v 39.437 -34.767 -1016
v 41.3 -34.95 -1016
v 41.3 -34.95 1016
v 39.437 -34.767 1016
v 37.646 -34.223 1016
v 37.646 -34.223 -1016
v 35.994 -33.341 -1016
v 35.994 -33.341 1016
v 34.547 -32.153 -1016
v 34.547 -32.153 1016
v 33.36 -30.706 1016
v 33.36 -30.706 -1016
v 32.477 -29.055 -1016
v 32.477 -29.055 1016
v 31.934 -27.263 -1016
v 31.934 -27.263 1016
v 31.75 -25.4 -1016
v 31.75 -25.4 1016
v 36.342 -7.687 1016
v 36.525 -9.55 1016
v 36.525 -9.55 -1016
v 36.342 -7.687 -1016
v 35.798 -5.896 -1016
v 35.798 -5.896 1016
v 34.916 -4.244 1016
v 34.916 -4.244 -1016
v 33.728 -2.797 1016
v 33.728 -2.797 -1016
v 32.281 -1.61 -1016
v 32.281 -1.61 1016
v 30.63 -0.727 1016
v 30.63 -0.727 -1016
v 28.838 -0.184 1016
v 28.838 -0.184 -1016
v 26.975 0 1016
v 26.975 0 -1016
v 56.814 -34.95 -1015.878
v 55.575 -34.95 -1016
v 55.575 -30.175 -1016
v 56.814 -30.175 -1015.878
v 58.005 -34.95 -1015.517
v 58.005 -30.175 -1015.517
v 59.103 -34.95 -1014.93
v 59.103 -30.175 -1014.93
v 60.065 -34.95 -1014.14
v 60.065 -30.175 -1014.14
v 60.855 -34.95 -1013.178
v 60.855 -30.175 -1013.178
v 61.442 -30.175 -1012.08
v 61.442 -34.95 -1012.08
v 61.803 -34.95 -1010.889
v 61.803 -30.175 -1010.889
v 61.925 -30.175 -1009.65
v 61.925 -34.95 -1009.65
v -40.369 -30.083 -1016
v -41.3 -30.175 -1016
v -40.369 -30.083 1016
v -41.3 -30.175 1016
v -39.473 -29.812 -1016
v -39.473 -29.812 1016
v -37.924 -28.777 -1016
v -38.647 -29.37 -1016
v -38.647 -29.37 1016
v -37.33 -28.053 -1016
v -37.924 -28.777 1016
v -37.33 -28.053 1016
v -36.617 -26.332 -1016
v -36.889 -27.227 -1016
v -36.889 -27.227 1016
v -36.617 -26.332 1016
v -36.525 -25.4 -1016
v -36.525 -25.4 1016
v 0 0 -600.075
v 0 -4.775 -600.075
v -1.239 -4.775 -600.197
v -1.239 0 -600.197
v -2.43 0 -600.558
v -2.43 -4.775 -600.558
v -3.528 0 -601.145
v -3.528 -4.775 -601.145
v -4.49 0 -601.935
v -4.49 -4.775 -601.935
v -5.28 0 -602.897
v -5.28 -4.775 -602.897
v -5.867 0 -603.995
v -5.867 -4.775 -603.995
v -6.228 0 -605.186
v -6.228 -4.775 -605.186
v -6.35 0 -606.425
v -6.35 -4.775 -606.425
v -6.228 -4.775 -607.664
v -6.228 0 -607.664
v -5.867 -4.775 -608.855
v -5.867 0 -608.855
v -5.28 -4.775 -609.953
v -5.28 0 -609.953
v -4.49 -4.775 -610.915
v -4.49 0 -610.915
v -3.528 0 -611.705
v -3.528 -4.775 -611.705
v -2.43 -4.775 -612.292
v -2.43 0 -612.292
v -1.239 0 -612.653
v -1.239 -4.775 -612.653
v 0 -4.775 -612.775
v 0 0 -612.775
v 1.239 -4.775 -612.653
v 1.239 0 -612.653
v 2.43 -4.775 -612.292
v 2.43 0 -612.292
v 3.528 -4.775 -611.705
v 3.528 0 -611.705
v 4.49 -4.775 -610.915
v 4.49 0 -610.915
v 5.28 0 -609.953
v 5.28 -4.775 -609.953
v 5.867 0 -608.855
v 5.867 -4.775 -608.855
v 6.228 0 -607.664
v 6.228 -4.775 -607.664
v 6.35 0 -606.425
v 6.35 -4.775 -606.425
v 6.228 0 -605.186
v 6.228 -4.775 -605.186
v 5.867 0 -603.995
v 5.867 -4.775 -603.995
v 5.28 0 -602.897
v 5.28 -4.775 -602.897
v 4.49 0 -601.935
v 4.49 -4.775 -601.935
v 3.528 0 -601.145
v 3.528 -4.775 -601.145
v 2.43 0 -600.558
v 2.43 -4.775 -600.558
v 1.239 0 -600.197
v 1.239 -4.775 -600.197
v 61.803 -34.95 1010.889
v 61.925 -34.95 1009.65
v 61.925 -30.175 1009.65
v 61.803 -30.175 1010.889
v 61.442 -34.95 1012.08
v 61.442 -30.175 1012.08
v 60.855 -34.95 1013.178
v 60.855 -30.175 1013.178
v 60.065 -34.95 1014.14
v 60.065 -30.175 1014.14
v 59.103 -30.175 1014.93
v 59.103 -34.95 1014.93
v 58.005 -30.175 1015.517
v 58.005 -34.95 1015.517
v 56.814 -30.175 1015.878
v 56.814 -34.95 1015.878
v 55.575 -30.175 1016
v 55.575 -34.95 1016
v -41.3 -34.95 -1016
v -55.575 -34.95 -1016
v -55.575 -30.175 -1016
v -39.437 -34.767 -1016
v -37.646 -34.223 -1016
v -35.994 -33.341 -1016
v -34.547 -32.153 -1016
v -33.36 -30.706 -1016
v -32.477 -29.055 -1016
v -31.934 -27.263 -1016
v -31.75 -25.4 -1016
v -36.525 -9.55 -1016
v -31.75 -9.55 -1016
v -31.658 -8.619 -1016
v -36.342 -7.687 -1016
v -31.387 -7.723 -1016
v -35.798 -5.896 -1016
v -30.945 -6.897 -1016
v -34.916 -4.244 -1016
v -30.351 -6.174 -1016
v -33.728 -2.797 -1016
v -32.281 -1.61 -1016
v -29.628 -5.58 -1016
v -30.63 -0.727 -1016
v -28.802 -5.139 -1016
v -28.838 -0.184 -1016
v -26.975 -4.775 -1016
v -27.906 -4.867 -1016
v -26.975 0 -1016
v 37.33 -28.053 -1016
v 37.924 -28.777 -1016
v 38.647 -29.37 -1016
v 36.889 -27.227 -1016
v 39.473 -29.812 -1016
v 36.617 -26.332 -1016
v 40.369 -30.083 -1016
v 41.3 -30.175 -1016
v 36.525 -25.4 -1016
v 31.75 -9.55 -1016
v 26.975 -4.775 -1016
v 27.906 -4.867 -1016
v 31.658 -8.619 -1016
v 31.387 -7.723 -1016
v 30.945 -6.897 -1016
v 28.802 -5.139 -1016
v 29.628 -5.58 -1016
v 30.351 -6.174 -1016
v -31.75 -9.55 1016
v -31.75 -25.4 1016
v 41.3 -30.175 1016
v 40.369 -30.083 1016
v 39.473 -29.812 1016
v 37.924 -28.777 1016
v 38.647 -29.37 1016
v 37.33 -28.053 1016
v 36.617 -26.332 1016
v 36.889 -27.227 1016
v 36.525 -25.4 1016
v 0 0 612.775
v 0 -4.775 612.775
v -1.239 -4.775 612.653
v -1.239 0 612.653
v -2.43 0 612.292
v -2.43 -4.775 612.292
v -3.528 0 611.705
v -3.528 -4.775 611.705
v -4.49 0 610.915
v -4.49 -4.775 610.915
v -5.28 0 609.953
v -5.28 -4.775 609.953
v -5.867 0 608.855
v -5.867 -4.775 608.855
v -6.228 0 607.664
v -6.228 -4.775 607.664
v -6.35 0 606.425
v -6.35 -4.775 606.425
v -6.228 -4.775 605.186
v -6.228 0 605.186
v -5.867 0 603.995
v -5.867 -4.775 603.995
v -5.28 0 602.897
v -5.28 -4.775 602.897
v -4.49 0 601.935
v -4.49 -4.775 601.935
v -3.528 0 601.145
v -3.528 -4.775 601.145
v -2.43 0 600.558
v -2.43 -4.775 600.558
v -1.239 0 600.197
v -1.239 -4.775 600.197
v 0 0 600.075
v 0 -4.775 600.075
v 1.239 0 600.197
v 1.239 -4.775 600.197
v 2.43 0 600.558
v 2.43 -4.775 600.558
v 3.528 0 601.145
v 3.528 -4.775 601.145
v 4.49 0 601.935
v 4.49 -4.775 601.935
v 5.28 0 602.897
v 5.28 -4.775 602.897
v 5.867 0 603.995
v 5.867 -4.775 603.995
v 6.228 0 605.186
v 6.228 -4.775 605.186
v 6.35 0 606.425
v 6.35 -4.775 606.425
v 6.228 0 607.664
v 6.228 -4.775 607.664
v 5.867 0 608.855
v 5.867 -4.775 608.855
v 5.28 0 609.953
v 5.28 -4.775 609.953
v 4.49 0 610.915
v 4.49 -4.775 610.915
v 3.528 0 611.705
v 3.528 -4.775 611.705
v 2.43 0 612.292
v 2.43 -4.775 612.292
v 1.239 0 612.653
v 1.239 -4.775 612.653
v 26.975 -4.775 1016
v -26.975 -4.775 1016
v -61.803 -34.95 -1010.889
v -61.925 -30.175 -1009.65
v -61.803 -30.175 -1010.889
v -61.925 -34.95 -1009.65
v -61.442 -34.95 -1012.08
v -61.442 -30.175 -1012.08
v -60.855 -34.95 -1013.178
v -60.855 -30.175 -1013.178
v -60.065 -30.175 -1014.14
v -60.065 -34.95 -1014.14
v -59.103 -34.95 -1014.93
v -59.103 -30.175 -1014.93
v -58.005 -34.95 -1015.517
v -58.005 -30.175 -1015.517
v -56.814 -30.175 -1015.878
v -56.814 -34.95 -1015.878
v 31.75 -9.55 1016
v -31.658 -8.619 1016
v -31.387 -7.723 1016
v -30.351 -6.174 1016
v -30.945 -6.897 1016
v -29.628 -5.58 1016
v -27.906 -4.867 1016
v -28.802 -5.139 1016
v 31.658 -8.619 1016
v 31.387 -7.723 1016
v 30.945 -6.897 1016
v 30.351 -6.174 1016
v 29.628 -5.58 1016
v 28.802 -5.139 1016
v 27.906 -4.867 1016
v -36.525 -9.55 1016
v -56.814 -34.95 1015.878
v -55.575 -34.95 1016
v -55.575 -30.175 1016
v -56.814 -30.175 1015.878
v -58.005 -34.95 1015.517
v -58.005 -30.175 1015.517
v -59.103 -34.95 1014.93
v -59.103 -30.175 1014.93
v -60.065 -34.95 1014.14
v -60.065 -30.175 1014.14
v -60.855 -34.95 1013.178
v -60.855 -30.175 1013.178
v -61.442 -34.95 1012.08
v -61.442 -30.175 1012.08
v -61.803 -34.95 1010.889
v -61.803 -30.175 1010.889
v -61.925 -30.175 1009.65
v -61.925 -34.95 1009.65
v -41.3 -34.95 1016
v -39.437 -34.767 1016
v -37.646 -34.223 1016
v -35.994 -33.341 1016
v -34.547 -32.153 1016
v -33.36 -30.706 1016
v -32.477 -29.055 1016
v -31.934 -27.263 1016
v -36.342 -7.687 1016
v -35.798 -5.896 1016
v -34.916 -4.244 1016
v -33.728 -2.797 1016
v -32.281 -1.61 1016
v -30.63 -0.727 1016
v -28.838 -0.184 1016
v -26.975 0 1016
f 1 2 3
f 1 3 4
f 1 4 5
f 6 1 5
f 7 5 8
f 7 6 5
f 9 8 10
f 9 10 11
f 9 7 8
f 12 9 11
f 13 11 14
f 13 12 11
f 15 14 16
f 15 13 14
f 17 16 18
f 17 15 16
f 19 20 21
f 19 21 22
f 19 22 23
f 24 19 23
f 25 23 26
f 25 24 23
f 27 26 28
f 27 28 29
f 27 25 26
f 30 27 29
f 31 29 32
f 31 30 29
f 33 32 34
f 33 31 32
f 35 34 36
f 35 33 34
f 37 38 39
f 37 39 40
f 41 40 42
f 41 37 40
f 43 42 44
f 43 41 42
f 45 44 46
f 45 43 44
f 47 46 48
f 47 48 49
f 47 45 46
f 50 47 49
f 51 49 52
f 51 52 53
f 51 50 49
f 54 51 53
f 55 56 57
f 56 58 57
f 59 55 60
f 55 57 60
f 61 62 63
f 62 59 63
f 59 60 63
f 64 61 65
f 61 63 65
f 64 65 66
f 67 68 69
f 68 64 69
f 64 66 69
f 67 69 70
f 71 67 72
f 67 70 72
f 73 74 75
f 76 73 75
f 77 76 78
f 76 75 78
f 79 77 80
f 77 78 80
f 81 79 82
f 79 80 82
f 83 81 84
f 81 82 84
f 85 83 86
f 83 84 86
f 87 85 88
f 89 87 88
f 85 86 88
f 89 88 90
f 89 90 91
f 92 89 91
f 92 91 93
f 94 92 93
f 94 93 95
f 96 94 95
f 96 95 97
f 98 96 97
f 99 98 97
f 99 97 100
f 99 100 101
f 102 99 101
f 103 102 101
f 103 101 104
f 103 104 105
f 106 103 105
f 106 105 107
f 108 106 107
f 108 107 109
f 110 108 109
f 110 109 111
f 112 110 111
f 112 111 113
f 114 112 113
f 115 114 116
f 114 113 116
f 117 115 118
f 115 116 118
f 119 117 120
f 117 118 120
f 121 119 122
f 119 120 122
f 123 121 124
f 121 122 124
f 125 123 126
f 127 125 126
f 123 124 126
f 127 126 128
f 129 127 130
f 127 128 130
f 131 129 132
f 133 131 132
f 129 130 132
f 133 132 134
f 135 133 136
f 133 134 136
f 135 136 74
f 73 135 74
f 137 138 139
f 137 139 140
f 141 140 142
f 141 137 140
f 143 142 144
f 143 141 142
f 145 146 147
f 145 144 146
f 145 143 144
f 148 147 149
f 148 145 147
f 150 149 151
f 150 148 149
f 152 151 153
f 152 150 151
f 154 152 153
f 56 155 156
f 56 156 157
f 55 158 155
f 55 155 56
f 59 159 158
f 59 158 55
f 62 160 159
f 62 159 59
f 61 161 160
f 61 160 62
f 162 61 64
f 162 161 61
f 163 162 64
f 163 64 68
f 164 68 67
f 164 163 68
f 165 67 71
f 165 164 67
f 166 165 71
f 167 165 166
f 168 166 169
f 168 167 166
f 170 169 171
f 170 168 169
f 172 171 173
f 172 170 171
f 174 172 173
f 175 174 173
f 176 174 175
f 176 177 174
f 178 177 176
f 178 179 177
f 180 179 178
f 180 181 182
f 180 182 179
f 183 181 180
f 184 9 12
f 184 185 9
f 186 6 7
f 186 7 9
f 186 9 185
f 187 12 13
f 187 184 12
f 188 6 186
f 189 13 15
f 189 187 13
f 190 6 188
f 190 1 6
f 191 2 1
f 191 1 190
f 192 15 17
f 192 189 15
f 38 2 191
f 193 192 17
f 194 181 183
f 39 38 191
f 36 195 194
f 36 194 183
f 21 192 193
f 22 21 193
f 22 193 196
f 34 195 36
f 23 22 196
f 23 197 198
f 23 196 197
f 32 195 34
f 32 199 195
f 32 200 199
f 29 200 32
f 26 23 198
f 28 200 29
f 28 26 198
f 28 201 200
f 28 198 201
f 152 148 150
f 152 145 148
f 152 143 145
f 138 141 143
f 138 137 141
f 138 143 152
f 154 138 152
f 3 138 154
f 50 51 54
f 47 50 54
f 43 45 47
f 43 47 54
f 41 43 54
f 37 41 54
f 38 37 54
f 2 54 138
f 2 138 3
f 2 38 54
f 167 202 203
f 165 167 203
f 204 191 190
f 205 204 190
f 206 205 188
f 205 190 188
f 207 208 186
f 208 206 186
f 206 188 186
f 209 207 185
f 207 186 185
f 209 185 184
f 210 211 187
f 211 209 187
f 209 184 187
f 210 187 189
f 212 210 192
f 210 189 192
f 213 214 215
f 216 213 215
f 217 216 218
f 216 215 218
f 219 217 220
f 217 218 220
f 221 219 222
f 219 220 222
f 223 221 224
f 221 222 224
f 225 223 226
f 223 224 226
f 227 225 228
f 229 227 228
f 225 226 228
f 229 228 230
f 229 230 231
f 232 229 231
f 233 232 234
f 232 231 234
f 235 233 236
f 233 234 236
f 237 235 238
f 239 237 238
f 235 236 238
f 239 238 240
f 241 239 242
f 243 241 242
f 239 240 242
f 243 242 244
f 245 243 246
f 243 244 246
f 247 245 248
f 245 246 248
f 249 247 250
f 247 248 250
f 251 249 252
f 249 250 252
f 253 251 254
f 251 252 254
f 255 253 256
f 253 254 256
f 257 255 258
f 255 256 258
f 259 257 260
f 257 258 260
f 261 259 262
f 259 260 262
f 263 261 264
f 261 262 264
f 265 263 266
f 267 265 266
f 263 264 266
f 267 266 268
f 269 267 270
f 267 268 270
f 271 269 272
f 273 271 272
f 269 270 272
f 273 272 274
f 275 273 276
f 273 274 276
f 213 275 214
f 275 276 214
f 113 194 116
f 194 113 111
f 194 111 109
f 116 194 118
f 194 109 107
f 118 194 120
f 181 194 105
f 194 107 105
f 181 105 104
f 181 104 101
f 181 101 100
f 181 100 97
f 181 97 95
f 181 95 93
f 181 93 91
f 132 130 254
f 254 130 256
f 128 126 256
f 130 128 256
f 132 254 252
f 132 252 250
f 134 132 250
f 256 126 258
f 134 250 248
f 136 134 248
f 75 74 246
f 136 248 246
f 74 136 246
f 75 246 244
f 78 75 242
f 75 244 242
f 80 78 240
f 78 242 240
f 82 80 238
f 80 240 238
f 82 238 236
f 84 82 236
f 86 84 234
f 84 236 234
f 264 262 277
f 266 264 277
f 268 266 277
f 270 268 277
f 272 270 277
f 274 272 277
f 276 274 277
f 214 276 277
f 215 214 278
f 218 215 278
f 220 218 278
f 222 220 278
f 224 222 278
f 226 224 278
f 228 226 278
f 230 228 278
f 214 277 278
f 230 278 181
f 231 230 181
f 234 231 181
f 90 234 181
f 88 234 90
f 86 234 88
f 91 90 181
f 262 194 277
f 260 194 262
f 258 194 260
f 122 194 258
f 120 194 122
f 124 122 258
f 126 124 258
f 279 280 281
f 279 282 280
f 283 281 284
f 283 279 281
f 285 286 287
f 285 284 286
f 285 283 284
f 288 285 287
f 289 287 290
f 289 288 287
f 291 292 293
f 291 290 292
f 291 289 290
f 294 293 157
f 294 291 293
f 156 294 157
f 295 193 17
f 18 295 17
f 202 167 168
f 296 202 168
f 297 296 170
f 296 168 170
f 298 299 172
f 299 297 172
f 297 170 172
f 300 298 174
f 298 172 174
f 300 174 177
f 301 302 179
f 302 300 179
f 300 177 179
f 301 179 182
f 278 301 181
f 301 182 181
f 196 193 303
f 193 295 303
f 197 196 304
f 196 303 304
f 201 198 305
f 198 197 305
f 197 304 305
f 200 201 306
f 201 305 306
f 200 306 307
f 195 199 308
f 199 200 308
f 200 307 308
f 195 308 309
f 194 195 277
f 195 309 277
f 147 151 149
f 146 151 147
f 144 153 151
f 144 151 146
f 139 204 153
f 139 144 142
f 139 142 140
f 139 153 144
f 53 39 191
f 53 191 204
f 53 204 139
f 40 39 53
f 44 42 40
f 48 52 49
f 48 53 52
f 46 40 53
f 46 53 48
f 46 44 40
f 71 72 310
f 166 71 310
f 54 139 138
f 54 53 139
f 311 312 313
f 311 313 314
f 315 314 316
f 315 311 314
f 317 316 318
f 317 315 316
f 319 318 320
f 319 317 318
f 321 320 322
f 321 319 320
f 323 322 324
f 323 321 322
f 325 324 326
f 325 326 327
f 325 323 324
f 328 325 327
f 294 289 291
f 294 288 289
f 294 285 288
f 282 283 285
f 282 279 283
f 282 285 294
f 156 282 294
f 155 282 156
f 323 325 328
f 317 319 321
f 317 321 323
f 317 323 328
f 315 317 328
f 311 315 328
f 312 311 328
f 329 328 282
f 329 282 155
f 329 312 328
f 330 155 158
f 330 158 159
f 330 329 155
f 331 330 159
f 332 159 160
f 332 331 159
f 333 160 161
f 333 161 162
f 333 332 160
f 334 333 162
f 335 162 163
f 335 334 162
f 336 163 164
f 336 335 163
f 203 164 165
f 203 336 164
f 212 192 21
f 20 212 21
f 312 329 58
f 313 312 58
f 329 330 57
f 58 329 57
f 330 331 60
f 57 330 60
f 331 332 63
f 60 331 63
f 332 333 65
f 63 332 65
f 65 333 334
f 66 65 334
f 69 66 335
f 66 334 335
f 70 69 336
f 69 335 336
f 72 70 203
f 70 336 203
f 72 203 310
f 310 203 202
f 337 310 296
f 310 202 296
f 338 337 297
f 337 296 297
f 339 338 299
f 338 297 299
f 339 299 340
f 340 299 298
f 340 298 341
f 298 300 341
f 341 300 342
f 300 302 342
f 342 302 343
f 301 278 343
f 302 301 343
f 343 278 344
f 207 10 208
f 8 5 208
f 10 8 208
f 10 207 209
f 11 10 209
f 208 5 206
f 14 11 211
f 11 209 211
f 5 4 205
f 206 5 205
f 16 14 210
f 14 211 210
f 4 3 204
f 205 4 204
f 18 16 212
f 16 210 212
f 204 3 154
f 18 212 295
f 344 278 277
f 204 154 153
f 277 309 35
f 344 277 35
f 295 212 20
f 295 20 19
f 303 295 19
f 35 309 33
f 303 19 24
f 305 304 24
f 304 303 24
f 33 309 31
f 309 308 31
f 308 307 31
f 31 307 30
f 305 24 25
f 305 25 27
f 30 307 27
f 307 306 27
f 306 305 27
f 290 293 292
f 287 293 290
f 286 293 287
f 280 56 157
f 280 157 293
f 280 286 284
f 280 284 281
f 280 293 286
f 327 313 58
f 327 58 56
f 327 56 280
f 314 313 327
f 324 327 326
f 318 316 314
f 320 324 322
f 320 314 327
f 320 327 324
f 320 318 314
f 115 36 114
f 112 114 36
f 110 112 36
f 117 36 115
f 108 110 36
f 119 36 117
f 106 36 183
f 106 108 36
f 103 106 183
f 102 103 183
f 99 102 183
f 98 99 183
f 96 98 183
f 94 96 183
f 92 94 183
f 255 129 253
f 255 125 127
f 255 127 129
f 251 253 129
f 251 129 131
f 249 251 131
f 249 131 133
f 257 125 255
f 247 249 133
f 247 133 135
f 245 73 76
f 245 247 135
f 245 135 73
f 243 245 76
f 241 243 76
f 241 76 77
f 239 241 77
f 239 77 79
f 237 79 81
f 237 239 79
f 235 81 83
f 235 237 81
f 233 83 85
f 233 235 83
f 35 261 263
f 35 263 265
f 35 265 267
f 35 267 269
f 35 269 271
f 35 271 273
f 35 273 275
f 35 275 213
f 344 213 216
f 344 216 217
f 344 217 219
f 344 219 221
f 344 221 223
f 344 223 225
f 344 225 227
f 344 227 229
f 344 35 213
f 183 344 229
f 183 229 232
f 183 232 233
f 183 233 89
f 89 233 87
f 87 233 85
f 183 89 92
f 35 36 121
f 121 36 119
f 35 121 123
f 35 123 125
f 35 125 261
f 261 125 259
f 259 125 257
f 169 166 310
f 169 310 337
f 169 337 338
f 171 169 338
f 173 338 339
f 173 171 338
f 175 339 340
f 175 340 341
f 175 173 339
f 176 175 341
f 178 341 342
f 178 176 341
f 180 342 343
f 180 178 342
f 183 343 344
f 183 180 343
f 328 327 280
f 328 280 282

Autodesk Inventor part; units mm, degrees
ref_plane "YZ Plane" through (0, 0, 0) normal (1, 0, 0) x (0, 1, 0)
ref_plane "XZ Plane" through (0, 0, 0) normal (0, 1, 0) x (-1, 0, 0)
ref_plane "XY Plane" through (0, 0, 0) normal (0, 0, 1) x (1, 0, 0)
sketch "Sketch1" plane through (0, 0, 0) normal (0, 0, 1) x (1, 0, 0)
  point P0 (0, 0)
sketch "Sketch2" plane through (0, 0, 0) normal (0, 1, 0) x (-1, 0, 0)
  line L0 (-31.75, 1016) -> (31.75, 1016)
  line L1 (31.75, 1016) -> (31.75, -1016)
  line L2 (31.75, -1016) -> (-31.75, -1016)
  line L3 (-31.75, -1016) -> (-31.75, 1016)
  line L4 (-31.75, 1016) -> (31.75, -1016) construction
  line L5 (31.75, 1016) -> (-31.75, -1016) construction
  line L6 (0, -1016) -> (0, 1016)
  point P0 (0, 0)
  point P1 (0, -657.225)
  point P2 (0, -606.425)
  point P3 (0, 657.225)
  point P4 (0, 606.425)
  point P5 (0, 0)
  dimension "d0" = 63.5
  dimension "d1" = 2032
  dimension "d24" = 50.8
  dimension "d26" = 50.8
  dimension "d27" = 1212.85
  dimension "d28" = 606.425
extrude "Plate1" add sketch "Sketch2" against normal blind 4.7752
sketch "Sketch3" plane through (36.5252, 0, 1016) normal (-1, 0, 0) x (0, -1, 0)
  line L0 (0, -2032) -> (0, 0)
  line L1 (0, 0) -> (30.1752, 0)
  line L2 (30.1752, 0) -> (30.1752, -2032)
  line L3 (30.1752, -2032) -> (0, -2032)
edge flange "Flange1" height 25.4 angle 90 thickness 4.7752 bend radius 4.7752 thickness toward (-1, 0, 0) relief tear relief width 4.7752 relief depth 2.3876 corner gap 4.7752 corner form 0 edges at (31.75, -4.7752, 0) (-31.75, -4.7752, 0) wall of the first edge with corners at (36.5252, 0, -1016) (36.5252, 0, 1016) (36.5252, -30.1752, 1016) (36.5252, -30.1752, -1016)
bend "Bend1"
corner "Corner1"
sketch "Sketch4" plane through (31.75, -34.9504, -1016) normal (0, 1, 0) x (-1, 0, 0)
  line L0 (0, 2032) -> (0, 0)
  line L1 (0, 0) -> (-30.1752, 0)
  line L2 (-30.1752, 0) -> (-30.1752, 2032)
  line L3 (-30.1752, 2032) -> (0, 2032)
edge flange "Flange2" height 25.4 angle 90 thickness 4.7752 bend radius 4.7752 thickness toward (0, 1, 0) relief tear relief width 4.7752 relief depth 2.3876 corner gap 4.7752 corner form 0 edges at (36.5252, -30.1752, 0) (-36.5252, -30.1752, 0) wall of the first edge with corners at (31.75, -34.9504, 1016) (31.75, -34.9504, -1016) (61.9252, -34.9504, -1016) (61.9252, -34.9504, 1016)
bend "Bend2"
corner "Corner2"
hole "Hole1" at (0, 0, 606.425) at (0, 0, -606.425) direction (0, -1, 0) diameter 12.7 end through all
fillet "Corner Round1" radius 6.35 4 edges at (61.9252, -32.5628, 1016) (-61.9252, -32.5628, 1016) (-61.9252, -32.5628, -1016) (61.9252, -32.5628, -1016)
equation "\"d28\" = 0.5 * d27"
equation "\"d34\" = Thickness"
equation "\"d2\" = Thickness"
equation "\"d3\" = BendReliefWidth"
equation "\"d4\" = BendReliefDepth"
equation "\"d5\" = MinimumRemnant"
equation "\"d6\" = TransitionRadius"
equation "\"d9\" = BendRadius"
equation "\"d10\" = CornerReliefSize"
equation "\"d11\" = GapSize"
equation "\"d12\" = JacobiRadiusSize"
equation "\"d13\" = BendReliefWidth"
equation "\"d14\" = BendReliefDepth"
equation "\"d15\" = MinimumRemnant"
equation "\"d16\" = TransitionRadius"
equation "\"d19\" = BendRadius"
equation "\"d20\" = CornerReliefSize"
equation "\"d21\" = GapSize"
equation "\"d22\" = JacobiRadiusSize"
equation "\"BendRadius\" = Thickness"
equation "\"BendReliefWidth\" = Thickness"
equation "\"BendReliefDepth\" = 0.5 * Thickness"
equation "\"CornerReliefSize\" = 4 * Thickness"
equation "\"MinimumRemnant\" = 2 * Thickness"
equation "\"TransitionRadius\" = BendRadius"
equation "\"JacobiRadiusSize\" = BendRadius"
equation "\"GapSize\" = Thickness"
equation "\"Thickness\" = 4.7752"
properties part number "5th Wheel Hitch Sliding rail"
